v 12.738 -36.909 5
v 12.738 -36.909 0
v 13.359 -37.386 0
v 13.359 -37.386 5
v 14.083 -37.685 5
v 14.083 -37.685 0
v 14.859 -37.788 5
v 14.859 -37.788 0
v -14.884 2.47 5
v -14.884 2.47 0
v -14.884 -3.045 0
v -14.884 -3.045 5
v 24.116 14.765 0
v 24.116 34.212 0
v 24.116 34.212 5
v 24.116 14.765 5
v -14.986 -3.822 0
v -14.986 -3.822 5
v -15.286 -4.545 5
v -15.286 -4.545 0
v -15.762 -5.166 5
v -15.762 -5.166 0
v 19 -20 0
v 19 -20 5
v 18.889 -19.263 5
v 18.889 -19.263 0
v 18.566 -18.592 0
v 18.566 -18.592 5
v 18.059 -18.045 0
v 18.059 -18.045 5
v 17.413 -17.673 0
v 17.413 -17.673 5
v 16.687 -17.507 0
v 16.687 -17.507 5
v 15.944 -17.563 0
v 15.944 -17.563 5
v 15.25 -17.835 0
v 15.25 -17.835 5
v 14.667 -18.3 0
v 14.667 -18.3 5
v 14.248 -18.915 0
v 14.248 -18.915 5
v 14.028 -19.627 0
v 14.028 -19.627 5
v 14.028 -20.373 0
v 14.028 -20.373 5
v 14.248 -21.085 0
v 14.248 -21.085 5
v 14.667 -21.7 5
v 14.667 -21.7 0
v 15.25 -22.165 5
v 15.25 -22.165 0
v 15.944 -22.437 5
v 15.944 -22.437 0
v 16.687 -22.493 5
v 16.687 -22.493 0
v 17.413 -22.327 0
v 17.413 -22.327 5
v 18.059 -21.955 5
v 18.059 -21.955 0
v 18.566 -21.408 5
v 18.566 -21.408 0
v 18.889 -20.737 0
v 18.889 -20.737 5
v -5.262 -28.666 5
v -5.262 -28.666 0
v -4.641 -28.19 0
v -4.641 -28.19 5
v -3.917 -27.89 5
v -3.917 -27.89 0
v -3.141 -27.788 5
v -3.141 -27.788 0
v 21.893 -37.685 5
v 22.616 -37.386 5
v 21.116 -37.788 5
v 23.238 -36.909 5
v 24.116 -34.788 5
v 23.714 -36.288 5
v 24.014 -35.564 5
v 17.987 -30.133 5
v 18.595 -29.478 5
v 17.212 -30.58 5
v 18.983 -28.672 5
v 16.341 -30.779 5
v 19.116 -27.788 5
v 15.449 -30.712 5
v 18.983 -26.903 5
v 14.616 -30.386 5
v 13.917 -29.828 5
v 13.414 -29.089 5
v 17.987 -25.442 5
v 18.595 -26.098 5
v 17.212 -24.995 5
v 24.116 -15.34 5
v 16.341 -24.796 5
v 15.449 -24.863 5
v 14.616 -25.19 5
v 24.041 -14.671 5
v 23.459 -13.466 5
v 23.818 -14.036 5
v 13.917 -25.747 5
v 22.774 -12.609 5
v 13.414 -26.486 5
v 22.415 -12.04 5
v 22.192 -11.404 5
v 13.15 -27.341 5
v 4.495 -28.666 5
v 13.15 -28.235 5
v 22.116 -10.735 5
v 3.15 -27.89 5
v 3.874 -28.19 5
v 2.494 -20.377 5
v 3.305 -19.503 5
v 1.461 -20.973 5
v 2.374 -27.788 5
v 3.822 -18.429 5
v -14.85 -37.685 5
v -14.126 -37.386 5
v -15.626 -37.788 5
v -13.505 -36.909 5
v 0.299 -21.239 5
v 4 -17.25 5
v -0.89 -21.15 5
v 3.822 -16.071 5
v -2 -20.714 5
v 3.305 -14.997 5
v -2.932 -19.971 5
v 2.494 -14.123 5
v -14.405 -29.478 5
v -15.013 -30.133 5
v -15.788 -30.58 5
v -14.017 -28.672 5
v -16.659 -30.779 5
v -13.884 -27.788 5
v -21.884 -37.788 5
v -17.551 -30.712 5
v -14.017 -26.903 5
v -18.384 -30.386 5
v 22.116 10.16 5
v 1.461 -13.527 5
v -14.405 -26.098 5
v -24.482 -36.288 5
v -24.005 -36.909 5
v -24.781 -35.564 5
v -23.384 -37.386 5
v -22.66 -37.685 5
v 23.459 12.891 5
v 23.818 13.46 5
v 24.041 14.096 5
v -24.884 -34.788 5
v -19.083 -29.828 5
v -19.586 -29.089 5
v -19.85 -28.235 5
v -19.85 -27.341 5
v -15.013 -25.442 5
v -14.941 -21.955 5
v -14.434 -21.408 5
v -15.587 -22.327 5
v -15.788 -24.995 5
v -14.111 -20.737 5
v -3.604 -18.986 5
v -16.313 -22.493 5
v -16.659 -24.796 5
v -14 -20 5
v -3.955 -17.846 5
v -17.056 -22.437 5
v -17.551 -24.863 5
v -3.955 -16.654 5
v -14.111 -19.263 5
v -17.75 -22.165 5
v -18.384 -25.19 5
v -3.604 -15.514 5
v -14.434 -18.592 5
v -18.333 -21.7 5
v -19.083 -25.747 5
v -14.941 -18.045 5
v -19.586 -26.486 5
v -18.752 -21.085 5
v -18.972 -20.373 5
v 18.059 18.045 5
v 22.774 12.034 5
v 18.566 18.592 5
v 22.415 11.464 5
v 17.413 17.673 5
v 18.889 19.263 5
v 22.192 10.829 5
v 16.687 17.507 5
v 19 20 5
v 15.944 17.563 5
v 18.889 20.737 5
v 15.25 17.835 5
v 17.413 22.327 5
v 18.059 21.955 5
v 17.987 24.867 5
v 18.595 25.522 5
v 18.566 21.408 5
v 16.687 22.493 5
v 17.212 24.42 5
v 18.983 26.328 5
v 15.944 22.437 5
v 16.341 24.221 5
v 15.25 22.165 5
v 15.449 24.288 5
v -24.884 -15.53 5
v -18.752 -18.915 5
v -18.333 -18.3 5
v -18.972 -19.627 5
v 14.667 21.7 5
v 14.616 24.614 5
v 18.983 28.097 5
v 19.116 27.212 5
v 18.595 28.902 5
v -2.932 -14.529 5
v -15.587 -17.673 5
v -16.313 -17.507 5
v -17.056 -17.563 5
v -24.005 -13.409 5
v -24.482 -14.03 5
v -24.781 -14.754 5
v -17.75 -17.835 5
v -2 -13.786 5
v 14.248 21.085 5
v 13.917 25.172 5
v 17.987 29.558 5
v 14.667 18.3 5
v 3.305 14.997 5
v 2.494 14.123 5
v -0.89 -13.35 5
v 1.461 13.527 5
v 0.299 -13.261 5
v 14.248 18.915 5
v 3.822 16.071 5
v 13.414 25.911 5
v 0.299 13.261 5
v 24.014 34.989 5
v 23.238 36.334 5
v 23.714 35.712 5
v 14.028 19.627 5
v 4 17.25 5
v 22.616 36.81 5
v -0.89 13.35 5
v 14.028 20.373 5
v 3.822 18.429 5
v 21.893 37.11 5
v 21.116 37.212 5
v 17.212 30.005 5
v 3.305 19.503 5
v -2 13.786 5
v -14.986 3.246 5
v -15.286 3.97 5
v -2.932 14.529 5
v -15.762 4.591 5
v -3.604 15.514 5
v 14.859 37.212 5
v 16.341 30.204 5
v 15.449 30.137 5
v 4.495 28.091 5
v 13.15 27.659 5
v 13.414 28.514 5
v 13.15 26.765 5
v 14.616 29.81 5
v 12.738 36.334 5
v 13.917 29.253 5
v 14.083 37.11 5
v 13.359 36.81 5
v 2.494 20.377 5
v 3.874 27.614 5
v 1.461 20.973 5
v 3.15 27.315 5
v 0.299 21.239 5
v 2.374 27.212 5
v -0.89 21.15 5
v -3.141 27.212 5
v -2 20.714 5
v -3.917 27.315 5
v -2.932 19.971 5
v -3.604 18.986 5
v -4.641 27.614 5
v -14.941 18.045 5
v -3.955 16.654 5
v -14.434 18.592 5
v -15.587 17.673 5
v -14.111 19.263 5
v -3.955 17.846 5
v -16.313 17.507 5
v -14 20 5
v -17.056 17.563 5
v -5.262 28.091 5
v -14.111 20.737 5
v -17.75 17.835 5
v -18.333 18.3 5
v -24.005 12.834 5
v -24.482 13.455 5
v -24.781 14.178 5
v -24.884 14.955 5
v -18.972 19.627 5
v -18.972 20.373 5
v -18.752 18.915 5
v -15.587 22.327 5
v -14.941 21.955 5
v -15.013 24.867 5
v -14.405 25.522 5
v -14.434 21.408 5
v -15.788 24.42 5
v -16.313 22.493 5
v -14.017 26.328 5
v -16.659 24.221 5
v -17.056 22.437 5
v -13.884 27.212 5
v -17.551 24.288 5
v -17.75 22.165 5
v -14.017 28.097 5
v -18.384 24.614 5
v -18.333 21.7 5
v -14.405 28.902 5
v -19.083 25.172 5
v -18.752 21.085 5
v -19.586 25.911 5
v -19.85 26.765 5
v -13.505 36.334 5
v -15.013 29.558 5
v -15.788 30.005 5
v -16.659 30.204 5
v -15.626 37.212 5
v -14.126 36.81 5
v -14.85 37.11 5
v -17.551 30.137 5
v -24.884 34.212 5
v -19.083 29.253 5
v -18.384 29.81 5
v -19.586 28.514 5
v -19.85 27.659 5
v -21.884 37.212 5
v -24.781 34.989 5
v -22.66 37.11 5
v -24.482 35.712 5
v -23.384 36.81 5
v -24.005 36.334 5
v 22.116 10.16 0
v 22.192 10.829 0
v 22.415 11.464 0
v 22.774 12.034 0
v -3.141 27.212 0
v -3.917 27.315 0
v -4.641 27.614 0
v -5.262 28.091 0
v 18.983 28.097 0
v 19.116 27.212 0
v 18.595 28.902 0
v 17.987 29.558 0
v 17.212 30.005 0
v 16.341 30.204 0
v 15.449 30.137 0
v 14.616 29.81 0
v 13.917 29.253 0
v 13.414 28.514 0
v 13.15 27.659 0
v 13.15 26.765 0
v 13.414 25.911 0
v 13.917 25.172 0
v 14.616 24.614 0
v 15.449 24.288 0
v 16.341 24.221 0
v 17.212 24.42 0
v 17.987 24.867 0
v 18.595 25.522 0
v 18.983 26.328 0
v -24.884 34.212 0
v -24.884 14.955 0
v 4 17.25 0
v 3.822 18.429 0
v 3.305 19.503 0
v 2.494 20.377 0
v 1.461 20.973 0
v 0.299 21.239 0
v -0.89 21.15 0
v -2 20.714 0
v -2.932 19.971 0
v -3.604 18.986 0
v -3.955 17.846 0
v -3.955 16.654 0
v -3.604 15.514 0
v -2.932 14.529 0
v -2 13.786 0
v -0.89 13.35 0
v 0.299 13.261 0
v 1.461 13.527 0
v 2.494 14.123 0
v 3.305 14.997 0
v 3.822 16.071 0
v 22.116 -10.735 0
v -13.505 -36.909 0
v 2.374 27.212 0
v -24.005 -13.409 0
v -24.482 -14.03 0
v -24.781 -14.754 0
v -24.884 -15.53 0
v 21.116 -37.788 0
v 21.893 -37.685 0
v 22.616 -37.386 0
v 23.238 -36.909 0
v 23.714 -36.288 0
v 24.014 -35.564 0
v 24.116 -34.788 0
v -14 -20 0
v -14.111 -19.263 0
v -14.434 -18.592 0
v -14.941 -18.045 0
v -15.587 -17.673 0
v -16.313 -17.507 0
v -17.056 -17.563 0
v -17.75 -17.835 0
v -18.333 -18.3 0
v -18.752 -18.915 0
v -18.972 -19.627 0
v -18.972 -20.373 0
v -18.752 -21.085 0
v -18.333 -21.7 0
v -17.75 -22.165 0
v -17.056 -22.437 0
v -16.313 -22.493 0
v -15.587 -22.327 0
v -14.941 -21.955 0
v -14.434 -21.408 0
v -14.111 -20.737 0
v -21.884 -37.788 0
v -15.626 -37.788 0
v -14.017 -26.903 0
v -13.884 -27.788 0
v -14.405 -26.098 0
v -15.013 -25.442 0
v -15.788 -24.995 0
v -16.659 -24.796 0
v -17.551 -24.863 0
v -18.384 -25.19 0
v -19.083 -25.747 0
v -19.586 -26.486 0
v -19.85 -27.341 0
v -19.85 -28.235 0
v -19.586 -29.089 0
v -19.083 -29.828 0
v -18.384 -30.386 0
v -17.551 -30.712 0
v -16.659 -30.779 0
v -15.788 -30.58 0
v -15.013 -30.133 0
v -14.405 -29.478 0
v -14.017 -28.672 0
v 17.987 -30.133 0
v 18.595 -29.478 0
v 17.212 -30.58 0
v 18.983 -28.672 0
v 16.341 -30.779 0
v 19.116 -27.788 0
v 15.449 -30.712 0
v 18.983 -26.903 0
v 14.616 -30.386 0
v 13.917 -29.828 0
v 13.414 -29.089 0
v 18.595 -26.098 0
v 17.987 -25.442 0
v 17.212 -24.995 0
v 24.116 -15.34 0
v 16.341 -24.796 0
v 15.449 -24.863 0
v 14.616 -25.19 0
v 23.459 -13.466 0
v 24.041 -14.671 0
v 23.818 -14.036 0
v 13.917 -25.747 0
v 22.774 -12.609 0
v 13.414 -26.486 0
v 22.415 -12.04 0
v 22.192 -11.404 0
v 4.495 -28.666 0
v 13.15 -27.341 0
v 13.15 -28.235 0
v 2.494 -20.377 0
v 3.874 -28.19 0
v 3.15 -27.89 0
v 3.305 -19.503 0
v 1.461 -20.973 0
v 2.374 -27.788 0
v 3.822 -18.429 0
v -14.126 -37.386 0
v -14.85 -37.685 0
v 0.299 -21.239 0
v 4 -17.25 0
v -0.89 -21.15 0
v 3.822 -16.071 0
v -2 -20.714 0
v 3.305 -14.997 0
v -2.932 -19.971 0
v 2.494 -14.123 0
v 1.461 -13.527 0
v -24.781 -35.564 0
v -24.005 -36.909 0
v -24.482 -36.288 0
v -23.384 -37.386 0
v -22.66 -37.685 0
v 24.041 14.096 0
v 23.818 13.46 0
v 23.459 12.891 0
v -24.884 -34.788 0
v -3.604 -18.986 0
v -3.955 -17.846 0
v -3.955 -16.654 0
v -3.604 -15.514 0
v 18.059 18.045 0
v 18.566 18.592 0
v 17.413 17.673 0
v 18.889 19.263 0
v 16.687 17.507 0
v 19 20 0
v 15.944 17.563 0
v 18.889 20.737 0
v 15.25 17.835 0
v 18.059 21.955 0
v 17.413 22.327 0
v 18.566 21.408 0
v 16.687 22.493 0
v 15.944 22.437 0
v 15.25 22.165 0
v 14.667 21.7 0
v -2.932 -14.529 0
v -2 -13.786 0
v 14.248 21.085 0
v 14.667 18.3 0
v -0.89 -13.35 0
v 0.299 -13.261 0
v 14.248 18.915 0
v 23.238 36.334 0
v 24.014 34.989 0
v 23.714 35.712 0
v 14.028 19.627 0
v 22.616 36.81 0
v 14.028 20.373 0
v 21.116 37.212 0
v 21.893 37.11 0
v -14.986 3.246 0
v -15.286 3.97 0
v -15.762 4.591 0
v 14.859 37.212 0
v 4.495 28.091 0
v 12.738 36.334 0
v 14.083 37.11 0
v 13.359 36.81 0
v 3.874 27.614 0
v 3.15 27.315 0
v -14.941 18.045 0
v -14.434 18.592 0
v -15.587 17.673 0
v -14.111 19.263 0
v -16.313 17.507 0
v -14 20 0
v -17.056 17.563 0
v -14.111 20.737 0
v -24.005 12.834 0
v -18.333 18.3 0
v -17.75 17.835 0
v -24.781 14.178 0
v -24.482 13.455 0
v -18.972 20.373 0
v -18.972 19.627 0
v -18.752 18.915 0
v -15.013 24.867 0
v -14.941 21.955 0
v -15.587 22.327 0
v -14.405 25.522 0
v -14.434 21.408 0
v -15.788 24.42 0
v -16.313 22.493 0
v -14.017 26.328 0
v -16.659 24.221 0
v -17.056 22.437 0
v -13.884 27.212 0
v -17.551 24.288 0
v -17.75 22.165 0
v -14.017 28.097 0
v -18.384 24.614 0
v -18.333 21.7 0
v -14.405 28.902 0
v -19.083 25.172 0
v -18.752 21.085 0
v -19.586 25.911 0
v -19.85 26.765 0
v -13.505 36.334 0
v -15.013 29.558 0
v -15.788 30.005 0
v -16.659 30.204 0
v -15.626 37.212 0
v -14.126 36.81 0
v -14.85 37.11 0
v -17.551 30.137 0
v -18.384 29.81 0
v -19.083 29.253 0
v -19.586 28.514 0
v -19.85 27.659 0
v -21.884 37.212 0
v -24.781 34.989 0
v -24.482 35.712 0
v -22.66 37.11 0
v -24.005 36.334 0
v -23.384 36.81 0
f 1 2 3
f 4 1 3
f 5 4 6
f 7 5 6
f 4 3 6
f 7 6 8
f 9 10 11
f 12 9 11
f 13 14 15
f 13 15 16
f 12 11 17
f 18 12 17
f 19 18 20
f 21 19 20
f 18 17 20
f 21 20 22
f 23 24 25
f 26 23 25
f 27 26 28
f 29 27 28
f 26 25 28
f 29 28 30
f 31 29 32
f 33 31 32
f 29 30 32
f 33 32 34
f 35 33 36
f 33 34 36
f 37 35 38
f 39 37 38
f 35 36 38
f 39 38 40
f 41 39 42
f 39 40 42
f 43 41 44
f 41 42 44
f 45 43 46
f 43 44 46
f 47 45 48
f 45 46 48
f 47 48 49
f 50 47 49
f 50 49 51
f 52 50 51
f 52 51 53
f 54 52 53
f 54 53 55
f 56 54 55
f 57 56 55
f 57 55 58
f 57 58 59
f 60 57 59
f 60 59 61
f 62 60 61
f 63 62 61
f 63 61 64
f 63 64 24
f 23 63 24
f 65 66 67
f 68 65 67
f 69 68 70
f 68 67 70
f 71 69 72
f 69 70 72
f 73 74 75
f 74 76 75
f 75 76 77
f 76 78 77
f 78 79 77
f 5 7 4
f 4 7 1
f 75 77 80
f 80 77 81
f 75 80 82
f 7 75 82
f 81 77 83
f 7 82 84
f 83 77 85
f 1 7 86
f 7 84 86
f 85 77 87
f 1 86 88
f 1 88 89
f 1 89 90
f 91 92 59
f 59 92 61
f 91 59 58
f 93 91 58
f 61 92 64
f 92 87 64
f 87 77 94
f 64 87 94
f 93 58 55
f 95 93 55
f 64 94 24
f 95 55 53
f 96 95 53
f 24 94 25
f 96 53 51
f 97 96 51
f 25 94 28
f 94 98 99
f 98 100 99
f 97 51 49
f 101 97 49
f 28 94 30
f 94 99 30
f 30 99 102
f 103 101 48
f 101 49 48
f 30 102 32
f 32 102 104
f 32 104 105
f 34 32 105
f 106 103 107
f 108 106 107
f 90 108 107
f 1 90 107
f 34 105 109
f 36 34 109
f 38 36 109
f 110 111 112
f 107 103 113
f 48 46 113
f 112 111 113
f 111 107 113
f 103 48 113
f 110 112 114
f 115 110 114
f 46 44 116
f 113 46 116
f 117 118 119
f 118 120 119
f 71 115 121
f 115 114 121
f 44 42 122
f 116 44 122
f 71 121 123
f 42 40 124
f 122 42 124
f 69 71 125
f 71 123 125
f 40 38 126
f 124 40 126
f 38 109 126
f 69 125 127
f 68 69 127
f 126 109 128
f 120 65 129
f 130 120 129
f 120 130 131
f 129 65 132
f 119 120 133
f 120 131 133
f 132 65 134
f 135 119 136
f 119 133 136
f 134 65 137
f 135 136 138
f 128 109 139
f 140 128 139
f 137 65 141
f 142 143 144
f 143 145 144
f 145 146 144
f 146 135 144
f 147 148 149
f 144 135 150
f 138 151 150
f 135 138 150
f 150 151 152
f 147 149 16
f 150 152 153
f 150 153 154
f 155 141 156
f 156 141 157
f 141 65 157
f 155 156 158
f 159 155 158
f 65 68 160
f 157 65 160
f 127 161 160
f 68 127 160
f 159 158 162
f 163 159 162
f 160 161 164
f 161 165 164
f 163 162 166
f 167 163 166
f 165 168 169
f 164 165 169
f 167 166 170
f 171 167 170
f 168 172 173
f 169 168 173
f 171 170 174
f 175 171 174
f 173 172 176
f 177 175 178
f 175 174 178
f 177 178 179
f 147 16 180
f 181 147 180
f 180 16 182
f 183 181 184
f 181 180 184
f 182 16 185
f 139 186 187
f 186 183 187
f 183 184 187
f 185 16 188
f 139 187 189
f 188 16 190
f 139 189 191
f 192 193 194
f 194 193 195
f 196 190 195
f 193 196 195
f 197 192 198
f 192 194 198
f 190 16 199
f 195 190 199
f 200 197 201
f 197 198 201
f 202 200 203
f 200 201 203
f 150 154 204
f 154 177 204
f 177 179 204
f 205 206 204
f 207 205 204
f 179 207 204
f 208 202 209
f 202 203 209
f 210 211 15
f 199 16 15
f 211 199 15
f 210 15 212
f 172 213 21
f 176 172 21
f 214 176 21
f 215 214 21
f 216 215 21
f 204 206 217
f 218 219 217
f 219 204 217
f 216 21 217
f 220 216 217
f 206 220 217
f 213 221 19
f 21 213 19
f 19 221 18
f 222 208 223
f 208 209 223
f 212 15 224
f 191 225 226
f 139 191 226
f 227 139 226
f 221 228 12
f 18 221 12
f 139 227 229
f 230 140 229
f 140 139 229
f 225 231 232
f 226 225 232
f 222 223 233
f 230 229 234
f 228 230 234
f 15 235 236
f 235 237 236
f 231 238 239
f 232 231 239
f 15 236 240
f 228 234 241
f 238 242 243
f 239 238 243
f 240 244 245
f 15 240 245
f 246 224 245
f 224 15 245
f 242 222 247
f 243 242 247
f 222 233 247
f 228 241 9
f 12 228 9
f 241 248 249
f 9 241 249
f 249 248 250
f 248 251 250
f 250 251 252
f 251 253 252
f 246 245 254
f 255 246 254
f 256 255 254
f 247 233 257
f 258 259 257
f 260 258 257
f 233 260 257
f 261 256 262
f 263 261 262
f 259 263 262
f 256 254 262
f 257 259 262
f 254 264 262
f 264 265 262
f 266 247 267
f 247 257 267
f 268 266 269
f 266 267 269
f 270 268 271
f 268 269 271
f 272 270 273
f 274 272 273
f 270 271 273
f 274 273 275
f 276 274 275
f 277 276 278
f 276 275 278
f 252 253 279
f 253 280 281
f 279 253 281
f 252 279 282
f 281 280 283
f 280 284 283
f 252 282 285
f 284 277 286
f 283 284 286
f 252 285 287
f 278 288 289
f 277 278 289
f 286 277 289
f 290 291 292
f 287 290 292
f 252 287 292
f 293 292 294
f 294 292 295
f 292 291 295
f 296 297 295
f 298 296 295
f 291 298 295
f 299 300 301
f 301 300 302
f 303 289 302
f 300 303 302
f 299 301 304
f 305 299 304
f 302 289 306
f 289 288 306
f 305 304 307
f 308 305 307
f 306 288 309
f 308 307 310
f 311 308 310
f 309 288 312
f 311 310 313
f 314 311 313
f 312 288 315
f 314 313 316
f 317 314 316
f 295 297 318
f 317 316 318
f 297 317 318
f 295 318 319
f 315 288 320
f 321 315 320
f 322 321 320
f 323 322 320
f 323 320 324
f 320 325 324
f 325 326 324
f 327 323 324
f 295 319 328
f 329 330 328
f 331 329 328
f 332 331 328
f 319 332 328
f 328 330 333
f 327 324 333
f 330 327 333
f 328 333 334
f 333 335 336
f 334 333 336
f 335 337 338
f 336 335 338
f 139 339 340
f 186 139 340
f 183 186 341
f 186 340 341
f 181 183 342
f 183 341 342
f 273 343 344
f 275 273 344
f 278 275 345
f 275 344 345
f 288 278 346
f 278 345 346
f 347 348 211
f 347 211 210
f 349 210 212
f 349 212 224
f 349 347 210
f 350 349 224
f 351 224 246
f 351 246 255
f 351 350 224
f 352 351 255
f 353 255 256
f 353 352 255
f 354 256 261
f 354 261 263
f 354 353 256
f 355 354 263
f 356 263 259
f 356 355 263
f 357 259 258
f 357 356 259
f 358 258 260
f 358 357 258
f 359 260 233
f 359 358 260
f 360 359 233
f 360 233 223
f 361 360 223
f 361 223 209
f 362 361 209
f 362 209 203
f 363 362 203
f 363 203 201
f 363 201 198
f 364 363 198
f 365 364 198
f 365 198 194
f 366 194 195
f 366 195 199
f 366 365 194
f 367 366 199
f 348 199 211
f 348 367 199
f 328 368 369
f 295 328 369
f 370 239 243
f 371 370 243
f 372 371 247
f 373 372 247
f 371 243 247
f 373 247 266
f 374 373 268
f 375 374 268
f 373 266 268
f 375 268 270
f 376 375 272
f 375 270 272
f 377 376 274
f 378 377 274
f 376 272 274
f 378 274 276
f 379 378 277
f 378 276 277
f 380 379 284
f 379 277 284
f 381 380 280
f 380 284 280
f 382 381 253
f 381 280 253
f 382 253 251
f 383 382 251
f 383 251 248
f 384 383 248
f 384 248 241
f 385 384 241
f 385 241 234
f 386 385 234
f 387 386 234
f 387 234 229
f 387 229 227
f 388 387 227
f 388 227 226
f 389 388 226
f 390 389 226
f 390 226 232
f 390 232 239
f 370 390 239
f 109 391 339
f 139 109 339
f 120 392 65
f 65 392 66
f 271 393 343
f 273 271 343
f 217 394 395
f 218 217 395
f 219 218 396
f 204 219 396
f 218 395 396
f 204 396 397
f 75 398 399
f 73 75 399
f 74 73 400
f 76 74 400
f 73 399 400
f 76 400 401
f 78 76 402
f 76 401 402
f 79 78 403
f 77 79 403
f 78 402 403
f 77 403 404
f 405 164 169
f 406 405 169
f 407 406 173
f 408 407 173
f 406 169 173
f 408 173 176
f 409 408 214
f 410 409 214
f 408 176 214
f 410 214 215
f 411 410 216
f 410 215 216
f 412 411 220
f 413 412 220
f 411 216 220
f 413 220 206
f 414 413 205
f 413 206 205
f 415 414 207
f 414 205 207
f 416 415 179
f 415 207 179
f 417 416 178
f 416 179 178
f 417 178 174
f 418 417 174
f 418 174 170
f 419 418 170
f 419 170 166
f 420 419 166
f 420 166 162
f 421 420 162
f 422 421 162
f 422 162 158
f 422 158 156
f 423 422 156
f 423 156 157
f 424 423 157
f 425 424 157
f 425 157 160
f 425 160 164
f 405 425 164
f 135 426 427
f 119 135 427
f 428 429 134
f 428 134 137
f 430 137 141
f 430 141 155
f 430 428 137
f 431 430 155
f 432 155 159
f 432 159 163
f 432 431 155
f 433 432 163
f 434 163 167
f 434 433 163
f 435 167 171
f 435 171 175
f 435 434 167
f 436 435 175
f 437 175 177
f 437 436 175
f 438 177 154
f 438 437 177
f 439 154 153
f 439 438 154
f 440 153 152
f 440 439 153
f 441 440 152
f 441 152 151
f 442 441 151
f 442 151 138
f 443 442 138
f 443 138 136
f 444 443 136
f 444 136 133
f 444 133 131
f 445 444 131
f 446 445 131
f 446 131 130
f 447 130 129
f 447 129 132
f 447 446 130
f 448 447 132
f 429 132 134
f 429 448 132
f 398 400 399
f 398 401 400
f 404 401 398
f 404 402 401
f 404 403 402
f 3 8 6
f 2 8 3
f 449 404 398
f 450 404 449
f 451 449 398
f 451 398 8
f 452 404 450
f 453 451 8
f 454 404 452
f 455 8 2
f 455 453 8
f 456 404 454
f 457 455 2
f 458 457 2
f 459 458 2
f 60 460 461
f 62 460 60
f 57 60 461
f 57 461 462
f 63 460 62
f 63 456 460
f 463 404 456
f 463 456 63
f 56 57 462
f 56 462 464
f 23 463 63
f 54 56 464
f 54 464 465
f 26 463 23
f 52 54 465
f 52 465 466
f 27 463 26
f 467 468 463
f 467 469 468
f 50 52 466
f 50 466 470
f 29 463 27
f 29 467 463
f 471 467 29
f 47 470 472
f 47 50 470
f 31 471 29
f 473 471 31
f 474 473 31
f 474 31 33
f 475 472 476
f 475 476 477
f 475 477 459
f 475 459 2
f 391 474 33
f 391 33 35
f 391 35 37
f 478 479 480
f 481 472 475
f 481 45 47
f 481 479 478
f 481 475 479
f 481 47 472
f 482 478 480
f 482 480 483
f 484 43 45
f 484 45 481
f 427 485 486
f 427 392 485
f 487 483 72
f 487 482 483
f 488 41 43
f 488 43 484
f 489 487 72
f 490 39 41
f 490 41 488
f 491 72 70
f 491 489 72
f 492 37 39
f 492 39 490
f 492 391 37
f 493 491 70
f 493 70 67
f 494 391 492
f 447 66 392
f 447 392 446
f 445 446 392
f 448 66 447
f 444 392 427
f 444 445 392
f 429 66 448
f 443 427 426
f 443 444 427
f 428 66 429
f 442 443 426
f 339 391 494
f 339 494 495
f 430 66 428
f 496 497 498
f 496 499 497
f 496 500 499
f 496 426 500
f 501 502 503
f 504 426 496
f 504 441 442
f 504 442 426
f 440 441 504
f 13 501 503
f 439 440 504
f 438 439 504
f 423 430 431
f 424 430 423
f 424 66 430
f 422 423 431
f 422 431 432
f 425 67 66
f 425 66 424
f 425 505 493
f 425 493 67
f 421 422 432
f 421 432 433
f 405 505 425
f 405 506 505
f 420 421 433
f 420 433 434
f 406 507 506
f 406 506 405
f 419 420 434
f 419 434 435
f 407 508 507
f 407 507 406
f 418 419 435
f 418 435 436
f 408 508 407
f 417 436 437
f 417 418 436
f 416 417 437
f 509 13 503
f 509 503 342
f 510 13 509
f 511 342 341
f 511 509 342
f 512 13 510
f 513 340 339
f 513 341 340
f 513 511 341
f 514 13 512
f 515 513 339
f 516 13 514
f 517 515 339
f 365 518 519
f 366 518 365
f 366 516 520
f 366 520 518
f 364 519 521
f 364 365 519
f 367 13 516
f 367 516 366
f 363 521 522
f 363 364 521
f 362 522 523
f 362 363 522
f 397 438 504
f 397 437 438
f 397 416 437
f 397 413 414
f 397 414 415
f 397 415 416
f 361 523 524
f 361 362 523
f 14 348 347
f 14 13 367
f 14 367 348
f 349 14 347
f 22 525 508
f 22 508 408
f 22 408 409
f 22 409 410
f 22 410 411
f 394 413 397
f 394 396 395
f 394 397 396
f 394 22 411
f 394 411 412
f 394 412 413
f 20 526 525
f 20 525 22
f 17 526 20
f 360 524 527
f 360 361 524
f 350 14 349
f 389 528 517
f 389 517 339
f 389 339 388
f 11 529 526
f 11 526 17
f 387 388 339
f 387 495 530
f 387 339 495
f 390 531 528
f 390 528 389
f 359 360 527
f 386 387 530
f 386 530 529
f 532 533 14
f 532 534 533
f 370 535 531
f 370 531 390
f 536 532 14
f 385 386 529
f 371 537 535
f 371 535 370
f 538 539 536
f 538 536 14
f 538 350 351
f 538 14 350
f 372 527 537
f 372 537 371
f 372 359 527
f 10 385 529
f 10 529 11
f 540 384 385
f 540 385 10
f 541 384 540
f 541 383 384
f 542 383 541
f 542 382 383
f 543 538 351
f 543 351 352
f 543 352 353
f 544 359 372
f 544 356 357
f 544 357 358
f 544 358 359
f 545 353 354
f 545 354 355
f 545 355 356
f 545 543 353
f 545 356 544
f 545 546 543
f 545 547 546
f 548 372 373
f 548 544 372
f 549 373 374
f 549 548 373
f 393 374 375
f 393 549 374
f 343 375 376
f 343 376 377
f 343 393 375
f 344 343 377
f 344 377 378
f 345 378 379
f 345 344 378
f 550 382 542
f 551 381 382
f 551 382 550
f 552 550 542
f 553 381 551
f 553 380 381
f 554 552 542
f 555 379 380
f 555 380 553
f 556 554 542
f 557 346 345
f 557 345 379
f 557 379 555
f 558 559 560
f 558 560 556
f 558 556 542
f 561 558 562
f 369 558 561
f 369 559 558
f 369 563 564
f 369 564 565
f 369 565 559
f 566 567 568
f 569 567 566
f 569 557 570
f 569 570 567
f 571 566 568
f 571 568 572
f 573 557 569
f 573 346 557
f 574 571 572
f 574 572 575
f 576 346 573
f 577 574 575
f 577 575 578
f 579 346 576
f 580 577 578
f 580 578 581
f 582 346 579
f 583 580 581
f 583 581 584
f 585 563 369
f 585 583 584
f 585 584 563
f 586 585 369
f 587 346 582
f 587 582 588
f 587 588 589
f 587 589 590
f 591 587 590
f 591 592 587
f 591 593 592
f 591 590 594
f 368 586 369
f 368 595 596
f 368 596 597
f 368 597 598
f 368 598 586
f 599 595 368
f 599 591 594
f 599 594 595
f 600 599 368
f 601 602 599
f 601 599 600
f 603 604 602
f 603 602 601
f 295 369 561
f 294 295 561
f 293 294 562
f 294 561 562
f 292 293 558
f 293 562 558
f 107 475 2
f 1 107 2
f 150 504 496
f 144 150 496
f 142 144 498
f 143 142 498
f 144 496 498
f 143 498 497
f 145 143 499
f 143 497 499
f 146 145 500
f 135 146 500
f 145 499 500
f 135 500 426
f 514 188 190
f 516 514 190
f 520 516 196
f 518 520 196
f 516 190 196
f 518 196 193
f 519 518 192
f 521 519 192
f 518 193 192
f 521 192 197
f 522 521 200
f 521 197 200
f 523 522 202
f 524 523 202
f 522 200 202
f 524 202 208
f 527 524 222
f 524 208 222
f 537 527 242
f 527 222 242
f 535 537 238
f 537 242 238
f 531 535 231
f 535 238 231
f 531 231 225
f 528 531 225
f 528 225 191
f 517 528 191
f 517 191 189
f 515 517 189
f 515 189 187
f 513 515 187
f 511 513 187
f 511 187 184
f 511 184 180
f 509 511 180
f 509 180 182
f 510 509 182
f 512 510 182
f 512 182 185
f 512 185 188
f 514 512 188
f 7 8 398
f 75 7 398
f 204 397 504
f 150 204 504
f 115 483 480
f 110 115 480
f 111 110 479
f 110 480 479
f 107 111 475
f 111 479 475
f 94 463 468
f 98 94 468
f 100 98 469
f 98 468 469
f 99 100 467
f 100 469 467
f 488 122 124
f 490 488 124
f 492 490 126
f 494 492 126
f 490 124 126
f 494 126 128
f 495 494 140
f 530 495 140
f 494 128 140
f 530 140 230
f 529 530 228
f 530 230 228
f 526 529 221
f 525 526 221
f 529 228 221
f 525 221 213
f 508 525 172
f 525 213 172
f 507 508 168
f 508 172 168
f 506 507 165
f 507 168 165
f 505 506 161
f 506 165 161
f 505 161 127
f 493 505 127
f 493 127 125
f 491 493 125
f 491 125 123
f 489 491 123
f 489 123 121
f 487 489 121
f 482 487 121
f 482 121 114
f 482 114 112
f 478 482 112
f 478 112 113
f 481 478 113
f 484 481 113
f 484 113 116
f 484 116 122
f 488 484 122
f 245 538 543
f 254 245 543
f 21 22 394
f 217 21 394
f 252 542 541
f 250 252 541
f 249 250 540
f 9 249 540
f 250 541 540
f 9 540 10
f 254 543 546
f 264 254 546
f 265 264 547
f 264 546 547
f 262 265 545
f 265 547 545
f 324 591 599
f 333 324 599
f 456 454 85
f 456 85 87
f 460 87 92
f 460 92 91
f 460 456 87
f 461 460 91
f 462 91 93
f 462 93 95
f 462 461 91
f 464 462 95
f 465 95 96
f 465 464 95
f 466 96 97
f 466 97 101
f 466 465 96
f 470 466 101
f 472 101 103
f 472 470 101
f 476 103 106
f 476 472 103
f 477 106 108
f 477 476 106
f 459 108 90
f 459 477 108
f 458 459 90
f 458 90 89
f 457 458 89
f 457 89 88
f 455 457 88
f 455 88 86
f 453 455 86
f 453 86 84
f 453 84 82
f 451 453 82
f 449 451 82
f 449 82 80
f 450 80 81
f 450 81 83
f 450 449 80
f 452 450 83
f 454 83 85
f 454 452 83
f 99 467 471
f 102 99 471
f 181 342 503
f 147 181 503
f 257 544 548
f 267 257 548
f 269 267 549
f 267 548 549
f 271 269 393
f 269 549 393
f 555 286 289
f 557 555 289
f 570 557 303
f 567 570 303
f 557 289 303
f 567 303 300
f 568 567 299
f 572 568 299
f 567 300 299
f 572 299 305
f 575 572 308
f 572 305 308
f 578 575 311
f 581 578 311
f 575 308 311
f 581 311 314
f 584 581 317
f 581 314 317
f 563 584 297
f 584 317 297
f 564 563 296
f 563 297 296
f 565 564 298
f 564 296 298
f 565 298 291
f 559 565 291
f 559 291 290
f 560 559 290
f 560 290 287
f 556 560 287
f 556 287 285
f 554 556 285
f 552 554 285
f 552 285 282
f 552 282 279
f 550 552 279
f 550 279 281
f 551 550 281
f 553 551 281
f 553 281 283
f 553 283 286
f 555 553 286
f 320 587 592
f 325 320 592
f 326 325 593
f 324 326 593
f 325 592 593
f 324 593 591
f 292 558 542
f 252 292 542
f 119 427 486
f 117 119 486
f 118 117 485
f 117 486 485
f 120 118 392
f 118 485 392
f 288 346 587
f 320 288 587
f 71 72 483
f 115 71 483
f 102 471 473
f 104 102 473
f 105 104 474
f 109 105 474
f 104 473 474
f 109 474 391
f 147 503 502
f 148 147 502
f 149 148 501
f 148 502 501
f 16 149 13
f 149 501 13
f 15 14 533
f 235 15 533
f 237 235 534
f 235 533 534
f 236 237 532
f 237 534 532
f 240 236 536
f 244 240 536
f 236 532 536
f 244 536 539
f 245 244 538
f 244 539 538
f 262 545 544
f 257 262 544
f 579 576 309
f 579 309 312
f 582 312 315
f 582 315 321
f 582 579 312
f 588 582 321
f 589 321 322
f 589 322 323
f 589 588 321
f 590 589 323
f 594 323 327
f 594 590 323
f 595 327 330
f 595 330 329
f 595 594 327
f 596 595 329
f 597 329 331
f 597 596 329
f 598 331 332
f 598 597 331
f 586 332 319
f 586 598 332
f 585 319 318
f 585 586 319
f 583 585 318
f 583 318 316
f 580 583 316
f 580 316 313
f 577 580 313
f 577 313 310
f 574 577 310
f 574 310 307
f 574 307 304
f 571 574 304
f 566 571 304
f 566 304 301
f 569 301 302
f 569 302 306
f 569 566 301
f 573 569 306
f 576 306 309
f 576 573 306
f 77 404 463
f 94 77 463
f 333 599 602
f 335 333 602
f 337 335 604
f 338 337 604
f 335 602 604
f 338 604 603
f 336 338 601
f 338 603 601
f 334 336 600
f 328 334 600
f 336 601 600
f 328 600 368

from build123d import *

# Parameters (mm, degrees)
SKETCH2_R           = 3
BOSS_EXTRUDE1_DEPTH = 5
BOSS_EXTRUDE3_DEPTH = 5
CUT_EXTRUDE5_DEPTH  = 6
SKETCH10_R          = 4
SKETCH10_R_2        = 2.5
CUT_EXTRUDE6_DEPTH  = 10


with BuildPart() as part:
    # Sketch2 → Boss-Extrude1 (new body)
    with BuildSketch(Plane.XY):
        with BuildLine():
            Line((-15.626230545, 37.212307607), (-21.883589858, 37.212307607))
            ThreePointArc((-21.883589858, 37.212307607), (-24.004910201, 36.33362795), (-24.883589858, 34.212307607))
            Line((-24.883589858, 34.212307607), (-24.883589858, 14.954948294))
            ThreePointArc((-24.883589858, 14.954948294), (-24.655228455, 13.806897997), (-24.004910201, 12.83362795))
            Line((-24.004910201, 12.83362795), (-15.762269514, 4.590987263))
            ThreePointArc((-15.762269514, 4.590987263), (-15.11195126, 3.617717217), (-14.883589858, 2.46966692))
            Line((-14.883589858, 2.46966692), (-14.883589858, -3.045051706))
            ThreePointArc((-14.883589858, -3.045051706), (-15.11195126, -4.193102003), (-15.762269514, -5.16637205))
            Line((-15.762269514, -5.16637205), (-24.004910201, -13.409012737))
            ThreePointArc((-24.004910201, -13.409012737), (-24.655228455, -14.382282783), (-24.883589858, -15.53033308))
            Line((-24.883589858, -15.53033308), (-24.883589858, -34.787692393))
            ThreePointArc((-24.883589858, -34.787692393), (-24.004910201, -36.909012737), (-21.883589858, -37.787692393))
            Line((-21.883589858, -37.787692393), (-15.626230545, -37.787692393))
            ThreePointArc((-15.626230545, -37.787692393), (-14.478180248, -37.559330991), (-13.504910201, -36.909012737))
            Line((-13.504910201, -36.909012737), (-5.262269514, -28.66637205))
            ThreePointArc((-5.262269514, -28.66637205), (-4.288999468, -28.016053796), (-3.14094917, -27.787692393))
            Line((-3.14094917, -27.787692393), (2.373769455, -27.787692393))
            ThreePointArc((2.373769455, -27.787692393), (3.521819752, -28.016053796), (4.495089799, -28.66637205))
            Line((4.495089799, -28.66637205), (12.737730486, -36.909012737))
            ThreePointArc((12.737730486, -36.909012737), (13.711000532, -37.559330991), (14.85905083, -37.787692393))
            Line((14.85905083, -37.787692393), (21.116410142, -37.787692393))
            ThreePointArc((21.116410142, -37.787692393), (23.237730486, -36.909012737), (24.116410142, -34.787692393))
            Line((24.116410142, -34.787692393), (24.116410142, -15.340035571))
            ThreePointArc((24.116410142, -15.340035571), (23.9472951, -14.347014747), (23.459016571, -13.465950429))
            Line((23.459016571, -13.465950429), (22.773803714, -12.609434358))
            ThreePointArc((22.773803714, -12.609434358), (22.285525185, -11.728370039), (22.116410142, -10.735349215))
            Line((22.116410142, -10.735349215), (22.116410142, 10.159964429))
            ThreePointArc((22.116410142, 10.159964429), (22.285525185, 11.152985253), (22.773803714, 12.034049571))
            Line((22.773803714, 12.034049571), (23.459016571, 12.890565642))
            ThreePointArc((23.459016571, 12.890565642), (23.9472951, 13.771629961), (24.116410142, 14.764650785))
            Line((24.116410142, 14.764650785), (24.116410142, 34.212307607))
            ThreePointArc((24.116410142, 34.212307607), (23.237730486, 36.33362795), (21.116410142, 37.212307607))
            Line((21.116410142, 37.212307607), (14.85905083, 37.212307607))
            ThreePointArc((14.85905083, 37.212307607), (13.711000532, 36.983946204), (12.737730486, 36.33362795))
            Line((12.737730486, 36.33362795), (4.495089799, 28.090987263))
            ThreePointArc((4.495089799, 28.090987263), (3.521819752, 27.440669009), (2.373769455, 27.212307607))
            Line((2.373769455, 27.212307607), (-3.14094917, 27.212307607))
            ThreePointArc((-3.14094917, 27.212307607), (-4.288999468, 27.440669009), (-5.262269514, 28.090987263))
            Line((-5.262269514, 28.090987263), (-13.504910201, 36.33362795))
            ThreePointArc((-13.504910201, 36.33362795), (-14.478180248, 36.983946204), (-15.626230545, 37.212307607))
        make_face()
        with Locations((-16.883589858, -27.787692393)):
            Circle(SKETCH2_R, mode=Mode.SUBTRACT)
        with Locations((16.116410142, -27.787692393)):
            Circle(SKETCH2_R, mode=Mode.SUBTRACT)
        with Locations((16.116410142, 27.212307607)):
            Circle(SKETCH2_R, mode=Mode.SUBTRACT)
        with Locations((-16.883589858, 27.212307607)):
            Circle(SKETCH2_R, mode=Mode.SUBTRACT)
    extrude(amount=BOSS_EXTRUDE1_DEPTH)

    # Sketch7 → Boss-Extrude3 (add, through all)
    with BuildSketch(Plane(origin=(0, 0, 0), x_dir=(-1, 0, 0), z_dir=(0, 0, -1))):
        with BuildLine():
            Line((-24.116410142, 34.488479196), (-29.116410142, 34.488479196))
            ThreePointArc((-29.116410142, 34.488479196), (-32.651944048, 33.024013102), (-34.116410142, 29.488479196))
            Line((-34.116410142, 29.488479196), (-34.116410142, 19.488479196))
            ThreePointArc((-34.116410142, 19.488479196), (-32.651944048, 15.95294529), (-29.116410142, 14.488479196))
            Line((-29.116410142, 14.488479196), (-24.116410142, 14.488479196))
            Line((-24.116410142, 14.488479196), (-24.116410142, 34.488479196))
        make_face()
    extrude(amount=-BOSS_EXTRUDE3_DEPTH)

    # Sketch9 → Cut-Extrude5 (cut, through all)
    with BuildSketch(Plane(origin=(0, 0, 0), x_dir=(-1, 0, 0), z_dir=(0, 0, -1))):
        with BuildLine():
            Line((-24.116410142, 34.488479196), (-24.116410142, 14.488479196))
            Line((-24.116410142, 14.488479196), (-29.116410142, 14.488479196))
            ThreePointArc((-29.116410142, 14.488479196), (-32.651944048, 15.95294529), (-34.116410142, 19.488479196))
            Line((-34.116410142, 19.488479196), (-34.116410142, 29.488479196))
            ThreePointArc((-34.116410142, 29.488479196), (-32.651944048, 33.024013102), (-29.116410142, 34.488479196))
            Line((-29.116410142, 34.488479196), (-24.116410142, 34.488479196))
        make_face()
    extrude(amount=-CUT_EXTRUDE5_DEPTH, mode=Mode.SUBTRACT)

    # Sketch10 → Cut-Extrude6 (cut)
    with BuildSketch(Plane.XY.offset(5)):
        with Locations((0, 17.25)):
            Circle(SKETCH10_R)
        with Locations((0, -17.25)):
            Circle(SKETCH10_R)
        with Locations((16.5, 20)):
            Circle(SKETCH10_R_2)
        with Locations((16.5, -20)):
            Circle(SKETCH10_R_2)
        with Locations((-16.5, -20)):
            Circle(SKETCH10_R_2)
        with Locations((-16.5, 20)):
            Circle(SKETCH10_R_2)
    extrude(amount=-CUT_EXTRUDE6_DEPTH, mode=Mode.SUBTRACT)


solid = part.part
